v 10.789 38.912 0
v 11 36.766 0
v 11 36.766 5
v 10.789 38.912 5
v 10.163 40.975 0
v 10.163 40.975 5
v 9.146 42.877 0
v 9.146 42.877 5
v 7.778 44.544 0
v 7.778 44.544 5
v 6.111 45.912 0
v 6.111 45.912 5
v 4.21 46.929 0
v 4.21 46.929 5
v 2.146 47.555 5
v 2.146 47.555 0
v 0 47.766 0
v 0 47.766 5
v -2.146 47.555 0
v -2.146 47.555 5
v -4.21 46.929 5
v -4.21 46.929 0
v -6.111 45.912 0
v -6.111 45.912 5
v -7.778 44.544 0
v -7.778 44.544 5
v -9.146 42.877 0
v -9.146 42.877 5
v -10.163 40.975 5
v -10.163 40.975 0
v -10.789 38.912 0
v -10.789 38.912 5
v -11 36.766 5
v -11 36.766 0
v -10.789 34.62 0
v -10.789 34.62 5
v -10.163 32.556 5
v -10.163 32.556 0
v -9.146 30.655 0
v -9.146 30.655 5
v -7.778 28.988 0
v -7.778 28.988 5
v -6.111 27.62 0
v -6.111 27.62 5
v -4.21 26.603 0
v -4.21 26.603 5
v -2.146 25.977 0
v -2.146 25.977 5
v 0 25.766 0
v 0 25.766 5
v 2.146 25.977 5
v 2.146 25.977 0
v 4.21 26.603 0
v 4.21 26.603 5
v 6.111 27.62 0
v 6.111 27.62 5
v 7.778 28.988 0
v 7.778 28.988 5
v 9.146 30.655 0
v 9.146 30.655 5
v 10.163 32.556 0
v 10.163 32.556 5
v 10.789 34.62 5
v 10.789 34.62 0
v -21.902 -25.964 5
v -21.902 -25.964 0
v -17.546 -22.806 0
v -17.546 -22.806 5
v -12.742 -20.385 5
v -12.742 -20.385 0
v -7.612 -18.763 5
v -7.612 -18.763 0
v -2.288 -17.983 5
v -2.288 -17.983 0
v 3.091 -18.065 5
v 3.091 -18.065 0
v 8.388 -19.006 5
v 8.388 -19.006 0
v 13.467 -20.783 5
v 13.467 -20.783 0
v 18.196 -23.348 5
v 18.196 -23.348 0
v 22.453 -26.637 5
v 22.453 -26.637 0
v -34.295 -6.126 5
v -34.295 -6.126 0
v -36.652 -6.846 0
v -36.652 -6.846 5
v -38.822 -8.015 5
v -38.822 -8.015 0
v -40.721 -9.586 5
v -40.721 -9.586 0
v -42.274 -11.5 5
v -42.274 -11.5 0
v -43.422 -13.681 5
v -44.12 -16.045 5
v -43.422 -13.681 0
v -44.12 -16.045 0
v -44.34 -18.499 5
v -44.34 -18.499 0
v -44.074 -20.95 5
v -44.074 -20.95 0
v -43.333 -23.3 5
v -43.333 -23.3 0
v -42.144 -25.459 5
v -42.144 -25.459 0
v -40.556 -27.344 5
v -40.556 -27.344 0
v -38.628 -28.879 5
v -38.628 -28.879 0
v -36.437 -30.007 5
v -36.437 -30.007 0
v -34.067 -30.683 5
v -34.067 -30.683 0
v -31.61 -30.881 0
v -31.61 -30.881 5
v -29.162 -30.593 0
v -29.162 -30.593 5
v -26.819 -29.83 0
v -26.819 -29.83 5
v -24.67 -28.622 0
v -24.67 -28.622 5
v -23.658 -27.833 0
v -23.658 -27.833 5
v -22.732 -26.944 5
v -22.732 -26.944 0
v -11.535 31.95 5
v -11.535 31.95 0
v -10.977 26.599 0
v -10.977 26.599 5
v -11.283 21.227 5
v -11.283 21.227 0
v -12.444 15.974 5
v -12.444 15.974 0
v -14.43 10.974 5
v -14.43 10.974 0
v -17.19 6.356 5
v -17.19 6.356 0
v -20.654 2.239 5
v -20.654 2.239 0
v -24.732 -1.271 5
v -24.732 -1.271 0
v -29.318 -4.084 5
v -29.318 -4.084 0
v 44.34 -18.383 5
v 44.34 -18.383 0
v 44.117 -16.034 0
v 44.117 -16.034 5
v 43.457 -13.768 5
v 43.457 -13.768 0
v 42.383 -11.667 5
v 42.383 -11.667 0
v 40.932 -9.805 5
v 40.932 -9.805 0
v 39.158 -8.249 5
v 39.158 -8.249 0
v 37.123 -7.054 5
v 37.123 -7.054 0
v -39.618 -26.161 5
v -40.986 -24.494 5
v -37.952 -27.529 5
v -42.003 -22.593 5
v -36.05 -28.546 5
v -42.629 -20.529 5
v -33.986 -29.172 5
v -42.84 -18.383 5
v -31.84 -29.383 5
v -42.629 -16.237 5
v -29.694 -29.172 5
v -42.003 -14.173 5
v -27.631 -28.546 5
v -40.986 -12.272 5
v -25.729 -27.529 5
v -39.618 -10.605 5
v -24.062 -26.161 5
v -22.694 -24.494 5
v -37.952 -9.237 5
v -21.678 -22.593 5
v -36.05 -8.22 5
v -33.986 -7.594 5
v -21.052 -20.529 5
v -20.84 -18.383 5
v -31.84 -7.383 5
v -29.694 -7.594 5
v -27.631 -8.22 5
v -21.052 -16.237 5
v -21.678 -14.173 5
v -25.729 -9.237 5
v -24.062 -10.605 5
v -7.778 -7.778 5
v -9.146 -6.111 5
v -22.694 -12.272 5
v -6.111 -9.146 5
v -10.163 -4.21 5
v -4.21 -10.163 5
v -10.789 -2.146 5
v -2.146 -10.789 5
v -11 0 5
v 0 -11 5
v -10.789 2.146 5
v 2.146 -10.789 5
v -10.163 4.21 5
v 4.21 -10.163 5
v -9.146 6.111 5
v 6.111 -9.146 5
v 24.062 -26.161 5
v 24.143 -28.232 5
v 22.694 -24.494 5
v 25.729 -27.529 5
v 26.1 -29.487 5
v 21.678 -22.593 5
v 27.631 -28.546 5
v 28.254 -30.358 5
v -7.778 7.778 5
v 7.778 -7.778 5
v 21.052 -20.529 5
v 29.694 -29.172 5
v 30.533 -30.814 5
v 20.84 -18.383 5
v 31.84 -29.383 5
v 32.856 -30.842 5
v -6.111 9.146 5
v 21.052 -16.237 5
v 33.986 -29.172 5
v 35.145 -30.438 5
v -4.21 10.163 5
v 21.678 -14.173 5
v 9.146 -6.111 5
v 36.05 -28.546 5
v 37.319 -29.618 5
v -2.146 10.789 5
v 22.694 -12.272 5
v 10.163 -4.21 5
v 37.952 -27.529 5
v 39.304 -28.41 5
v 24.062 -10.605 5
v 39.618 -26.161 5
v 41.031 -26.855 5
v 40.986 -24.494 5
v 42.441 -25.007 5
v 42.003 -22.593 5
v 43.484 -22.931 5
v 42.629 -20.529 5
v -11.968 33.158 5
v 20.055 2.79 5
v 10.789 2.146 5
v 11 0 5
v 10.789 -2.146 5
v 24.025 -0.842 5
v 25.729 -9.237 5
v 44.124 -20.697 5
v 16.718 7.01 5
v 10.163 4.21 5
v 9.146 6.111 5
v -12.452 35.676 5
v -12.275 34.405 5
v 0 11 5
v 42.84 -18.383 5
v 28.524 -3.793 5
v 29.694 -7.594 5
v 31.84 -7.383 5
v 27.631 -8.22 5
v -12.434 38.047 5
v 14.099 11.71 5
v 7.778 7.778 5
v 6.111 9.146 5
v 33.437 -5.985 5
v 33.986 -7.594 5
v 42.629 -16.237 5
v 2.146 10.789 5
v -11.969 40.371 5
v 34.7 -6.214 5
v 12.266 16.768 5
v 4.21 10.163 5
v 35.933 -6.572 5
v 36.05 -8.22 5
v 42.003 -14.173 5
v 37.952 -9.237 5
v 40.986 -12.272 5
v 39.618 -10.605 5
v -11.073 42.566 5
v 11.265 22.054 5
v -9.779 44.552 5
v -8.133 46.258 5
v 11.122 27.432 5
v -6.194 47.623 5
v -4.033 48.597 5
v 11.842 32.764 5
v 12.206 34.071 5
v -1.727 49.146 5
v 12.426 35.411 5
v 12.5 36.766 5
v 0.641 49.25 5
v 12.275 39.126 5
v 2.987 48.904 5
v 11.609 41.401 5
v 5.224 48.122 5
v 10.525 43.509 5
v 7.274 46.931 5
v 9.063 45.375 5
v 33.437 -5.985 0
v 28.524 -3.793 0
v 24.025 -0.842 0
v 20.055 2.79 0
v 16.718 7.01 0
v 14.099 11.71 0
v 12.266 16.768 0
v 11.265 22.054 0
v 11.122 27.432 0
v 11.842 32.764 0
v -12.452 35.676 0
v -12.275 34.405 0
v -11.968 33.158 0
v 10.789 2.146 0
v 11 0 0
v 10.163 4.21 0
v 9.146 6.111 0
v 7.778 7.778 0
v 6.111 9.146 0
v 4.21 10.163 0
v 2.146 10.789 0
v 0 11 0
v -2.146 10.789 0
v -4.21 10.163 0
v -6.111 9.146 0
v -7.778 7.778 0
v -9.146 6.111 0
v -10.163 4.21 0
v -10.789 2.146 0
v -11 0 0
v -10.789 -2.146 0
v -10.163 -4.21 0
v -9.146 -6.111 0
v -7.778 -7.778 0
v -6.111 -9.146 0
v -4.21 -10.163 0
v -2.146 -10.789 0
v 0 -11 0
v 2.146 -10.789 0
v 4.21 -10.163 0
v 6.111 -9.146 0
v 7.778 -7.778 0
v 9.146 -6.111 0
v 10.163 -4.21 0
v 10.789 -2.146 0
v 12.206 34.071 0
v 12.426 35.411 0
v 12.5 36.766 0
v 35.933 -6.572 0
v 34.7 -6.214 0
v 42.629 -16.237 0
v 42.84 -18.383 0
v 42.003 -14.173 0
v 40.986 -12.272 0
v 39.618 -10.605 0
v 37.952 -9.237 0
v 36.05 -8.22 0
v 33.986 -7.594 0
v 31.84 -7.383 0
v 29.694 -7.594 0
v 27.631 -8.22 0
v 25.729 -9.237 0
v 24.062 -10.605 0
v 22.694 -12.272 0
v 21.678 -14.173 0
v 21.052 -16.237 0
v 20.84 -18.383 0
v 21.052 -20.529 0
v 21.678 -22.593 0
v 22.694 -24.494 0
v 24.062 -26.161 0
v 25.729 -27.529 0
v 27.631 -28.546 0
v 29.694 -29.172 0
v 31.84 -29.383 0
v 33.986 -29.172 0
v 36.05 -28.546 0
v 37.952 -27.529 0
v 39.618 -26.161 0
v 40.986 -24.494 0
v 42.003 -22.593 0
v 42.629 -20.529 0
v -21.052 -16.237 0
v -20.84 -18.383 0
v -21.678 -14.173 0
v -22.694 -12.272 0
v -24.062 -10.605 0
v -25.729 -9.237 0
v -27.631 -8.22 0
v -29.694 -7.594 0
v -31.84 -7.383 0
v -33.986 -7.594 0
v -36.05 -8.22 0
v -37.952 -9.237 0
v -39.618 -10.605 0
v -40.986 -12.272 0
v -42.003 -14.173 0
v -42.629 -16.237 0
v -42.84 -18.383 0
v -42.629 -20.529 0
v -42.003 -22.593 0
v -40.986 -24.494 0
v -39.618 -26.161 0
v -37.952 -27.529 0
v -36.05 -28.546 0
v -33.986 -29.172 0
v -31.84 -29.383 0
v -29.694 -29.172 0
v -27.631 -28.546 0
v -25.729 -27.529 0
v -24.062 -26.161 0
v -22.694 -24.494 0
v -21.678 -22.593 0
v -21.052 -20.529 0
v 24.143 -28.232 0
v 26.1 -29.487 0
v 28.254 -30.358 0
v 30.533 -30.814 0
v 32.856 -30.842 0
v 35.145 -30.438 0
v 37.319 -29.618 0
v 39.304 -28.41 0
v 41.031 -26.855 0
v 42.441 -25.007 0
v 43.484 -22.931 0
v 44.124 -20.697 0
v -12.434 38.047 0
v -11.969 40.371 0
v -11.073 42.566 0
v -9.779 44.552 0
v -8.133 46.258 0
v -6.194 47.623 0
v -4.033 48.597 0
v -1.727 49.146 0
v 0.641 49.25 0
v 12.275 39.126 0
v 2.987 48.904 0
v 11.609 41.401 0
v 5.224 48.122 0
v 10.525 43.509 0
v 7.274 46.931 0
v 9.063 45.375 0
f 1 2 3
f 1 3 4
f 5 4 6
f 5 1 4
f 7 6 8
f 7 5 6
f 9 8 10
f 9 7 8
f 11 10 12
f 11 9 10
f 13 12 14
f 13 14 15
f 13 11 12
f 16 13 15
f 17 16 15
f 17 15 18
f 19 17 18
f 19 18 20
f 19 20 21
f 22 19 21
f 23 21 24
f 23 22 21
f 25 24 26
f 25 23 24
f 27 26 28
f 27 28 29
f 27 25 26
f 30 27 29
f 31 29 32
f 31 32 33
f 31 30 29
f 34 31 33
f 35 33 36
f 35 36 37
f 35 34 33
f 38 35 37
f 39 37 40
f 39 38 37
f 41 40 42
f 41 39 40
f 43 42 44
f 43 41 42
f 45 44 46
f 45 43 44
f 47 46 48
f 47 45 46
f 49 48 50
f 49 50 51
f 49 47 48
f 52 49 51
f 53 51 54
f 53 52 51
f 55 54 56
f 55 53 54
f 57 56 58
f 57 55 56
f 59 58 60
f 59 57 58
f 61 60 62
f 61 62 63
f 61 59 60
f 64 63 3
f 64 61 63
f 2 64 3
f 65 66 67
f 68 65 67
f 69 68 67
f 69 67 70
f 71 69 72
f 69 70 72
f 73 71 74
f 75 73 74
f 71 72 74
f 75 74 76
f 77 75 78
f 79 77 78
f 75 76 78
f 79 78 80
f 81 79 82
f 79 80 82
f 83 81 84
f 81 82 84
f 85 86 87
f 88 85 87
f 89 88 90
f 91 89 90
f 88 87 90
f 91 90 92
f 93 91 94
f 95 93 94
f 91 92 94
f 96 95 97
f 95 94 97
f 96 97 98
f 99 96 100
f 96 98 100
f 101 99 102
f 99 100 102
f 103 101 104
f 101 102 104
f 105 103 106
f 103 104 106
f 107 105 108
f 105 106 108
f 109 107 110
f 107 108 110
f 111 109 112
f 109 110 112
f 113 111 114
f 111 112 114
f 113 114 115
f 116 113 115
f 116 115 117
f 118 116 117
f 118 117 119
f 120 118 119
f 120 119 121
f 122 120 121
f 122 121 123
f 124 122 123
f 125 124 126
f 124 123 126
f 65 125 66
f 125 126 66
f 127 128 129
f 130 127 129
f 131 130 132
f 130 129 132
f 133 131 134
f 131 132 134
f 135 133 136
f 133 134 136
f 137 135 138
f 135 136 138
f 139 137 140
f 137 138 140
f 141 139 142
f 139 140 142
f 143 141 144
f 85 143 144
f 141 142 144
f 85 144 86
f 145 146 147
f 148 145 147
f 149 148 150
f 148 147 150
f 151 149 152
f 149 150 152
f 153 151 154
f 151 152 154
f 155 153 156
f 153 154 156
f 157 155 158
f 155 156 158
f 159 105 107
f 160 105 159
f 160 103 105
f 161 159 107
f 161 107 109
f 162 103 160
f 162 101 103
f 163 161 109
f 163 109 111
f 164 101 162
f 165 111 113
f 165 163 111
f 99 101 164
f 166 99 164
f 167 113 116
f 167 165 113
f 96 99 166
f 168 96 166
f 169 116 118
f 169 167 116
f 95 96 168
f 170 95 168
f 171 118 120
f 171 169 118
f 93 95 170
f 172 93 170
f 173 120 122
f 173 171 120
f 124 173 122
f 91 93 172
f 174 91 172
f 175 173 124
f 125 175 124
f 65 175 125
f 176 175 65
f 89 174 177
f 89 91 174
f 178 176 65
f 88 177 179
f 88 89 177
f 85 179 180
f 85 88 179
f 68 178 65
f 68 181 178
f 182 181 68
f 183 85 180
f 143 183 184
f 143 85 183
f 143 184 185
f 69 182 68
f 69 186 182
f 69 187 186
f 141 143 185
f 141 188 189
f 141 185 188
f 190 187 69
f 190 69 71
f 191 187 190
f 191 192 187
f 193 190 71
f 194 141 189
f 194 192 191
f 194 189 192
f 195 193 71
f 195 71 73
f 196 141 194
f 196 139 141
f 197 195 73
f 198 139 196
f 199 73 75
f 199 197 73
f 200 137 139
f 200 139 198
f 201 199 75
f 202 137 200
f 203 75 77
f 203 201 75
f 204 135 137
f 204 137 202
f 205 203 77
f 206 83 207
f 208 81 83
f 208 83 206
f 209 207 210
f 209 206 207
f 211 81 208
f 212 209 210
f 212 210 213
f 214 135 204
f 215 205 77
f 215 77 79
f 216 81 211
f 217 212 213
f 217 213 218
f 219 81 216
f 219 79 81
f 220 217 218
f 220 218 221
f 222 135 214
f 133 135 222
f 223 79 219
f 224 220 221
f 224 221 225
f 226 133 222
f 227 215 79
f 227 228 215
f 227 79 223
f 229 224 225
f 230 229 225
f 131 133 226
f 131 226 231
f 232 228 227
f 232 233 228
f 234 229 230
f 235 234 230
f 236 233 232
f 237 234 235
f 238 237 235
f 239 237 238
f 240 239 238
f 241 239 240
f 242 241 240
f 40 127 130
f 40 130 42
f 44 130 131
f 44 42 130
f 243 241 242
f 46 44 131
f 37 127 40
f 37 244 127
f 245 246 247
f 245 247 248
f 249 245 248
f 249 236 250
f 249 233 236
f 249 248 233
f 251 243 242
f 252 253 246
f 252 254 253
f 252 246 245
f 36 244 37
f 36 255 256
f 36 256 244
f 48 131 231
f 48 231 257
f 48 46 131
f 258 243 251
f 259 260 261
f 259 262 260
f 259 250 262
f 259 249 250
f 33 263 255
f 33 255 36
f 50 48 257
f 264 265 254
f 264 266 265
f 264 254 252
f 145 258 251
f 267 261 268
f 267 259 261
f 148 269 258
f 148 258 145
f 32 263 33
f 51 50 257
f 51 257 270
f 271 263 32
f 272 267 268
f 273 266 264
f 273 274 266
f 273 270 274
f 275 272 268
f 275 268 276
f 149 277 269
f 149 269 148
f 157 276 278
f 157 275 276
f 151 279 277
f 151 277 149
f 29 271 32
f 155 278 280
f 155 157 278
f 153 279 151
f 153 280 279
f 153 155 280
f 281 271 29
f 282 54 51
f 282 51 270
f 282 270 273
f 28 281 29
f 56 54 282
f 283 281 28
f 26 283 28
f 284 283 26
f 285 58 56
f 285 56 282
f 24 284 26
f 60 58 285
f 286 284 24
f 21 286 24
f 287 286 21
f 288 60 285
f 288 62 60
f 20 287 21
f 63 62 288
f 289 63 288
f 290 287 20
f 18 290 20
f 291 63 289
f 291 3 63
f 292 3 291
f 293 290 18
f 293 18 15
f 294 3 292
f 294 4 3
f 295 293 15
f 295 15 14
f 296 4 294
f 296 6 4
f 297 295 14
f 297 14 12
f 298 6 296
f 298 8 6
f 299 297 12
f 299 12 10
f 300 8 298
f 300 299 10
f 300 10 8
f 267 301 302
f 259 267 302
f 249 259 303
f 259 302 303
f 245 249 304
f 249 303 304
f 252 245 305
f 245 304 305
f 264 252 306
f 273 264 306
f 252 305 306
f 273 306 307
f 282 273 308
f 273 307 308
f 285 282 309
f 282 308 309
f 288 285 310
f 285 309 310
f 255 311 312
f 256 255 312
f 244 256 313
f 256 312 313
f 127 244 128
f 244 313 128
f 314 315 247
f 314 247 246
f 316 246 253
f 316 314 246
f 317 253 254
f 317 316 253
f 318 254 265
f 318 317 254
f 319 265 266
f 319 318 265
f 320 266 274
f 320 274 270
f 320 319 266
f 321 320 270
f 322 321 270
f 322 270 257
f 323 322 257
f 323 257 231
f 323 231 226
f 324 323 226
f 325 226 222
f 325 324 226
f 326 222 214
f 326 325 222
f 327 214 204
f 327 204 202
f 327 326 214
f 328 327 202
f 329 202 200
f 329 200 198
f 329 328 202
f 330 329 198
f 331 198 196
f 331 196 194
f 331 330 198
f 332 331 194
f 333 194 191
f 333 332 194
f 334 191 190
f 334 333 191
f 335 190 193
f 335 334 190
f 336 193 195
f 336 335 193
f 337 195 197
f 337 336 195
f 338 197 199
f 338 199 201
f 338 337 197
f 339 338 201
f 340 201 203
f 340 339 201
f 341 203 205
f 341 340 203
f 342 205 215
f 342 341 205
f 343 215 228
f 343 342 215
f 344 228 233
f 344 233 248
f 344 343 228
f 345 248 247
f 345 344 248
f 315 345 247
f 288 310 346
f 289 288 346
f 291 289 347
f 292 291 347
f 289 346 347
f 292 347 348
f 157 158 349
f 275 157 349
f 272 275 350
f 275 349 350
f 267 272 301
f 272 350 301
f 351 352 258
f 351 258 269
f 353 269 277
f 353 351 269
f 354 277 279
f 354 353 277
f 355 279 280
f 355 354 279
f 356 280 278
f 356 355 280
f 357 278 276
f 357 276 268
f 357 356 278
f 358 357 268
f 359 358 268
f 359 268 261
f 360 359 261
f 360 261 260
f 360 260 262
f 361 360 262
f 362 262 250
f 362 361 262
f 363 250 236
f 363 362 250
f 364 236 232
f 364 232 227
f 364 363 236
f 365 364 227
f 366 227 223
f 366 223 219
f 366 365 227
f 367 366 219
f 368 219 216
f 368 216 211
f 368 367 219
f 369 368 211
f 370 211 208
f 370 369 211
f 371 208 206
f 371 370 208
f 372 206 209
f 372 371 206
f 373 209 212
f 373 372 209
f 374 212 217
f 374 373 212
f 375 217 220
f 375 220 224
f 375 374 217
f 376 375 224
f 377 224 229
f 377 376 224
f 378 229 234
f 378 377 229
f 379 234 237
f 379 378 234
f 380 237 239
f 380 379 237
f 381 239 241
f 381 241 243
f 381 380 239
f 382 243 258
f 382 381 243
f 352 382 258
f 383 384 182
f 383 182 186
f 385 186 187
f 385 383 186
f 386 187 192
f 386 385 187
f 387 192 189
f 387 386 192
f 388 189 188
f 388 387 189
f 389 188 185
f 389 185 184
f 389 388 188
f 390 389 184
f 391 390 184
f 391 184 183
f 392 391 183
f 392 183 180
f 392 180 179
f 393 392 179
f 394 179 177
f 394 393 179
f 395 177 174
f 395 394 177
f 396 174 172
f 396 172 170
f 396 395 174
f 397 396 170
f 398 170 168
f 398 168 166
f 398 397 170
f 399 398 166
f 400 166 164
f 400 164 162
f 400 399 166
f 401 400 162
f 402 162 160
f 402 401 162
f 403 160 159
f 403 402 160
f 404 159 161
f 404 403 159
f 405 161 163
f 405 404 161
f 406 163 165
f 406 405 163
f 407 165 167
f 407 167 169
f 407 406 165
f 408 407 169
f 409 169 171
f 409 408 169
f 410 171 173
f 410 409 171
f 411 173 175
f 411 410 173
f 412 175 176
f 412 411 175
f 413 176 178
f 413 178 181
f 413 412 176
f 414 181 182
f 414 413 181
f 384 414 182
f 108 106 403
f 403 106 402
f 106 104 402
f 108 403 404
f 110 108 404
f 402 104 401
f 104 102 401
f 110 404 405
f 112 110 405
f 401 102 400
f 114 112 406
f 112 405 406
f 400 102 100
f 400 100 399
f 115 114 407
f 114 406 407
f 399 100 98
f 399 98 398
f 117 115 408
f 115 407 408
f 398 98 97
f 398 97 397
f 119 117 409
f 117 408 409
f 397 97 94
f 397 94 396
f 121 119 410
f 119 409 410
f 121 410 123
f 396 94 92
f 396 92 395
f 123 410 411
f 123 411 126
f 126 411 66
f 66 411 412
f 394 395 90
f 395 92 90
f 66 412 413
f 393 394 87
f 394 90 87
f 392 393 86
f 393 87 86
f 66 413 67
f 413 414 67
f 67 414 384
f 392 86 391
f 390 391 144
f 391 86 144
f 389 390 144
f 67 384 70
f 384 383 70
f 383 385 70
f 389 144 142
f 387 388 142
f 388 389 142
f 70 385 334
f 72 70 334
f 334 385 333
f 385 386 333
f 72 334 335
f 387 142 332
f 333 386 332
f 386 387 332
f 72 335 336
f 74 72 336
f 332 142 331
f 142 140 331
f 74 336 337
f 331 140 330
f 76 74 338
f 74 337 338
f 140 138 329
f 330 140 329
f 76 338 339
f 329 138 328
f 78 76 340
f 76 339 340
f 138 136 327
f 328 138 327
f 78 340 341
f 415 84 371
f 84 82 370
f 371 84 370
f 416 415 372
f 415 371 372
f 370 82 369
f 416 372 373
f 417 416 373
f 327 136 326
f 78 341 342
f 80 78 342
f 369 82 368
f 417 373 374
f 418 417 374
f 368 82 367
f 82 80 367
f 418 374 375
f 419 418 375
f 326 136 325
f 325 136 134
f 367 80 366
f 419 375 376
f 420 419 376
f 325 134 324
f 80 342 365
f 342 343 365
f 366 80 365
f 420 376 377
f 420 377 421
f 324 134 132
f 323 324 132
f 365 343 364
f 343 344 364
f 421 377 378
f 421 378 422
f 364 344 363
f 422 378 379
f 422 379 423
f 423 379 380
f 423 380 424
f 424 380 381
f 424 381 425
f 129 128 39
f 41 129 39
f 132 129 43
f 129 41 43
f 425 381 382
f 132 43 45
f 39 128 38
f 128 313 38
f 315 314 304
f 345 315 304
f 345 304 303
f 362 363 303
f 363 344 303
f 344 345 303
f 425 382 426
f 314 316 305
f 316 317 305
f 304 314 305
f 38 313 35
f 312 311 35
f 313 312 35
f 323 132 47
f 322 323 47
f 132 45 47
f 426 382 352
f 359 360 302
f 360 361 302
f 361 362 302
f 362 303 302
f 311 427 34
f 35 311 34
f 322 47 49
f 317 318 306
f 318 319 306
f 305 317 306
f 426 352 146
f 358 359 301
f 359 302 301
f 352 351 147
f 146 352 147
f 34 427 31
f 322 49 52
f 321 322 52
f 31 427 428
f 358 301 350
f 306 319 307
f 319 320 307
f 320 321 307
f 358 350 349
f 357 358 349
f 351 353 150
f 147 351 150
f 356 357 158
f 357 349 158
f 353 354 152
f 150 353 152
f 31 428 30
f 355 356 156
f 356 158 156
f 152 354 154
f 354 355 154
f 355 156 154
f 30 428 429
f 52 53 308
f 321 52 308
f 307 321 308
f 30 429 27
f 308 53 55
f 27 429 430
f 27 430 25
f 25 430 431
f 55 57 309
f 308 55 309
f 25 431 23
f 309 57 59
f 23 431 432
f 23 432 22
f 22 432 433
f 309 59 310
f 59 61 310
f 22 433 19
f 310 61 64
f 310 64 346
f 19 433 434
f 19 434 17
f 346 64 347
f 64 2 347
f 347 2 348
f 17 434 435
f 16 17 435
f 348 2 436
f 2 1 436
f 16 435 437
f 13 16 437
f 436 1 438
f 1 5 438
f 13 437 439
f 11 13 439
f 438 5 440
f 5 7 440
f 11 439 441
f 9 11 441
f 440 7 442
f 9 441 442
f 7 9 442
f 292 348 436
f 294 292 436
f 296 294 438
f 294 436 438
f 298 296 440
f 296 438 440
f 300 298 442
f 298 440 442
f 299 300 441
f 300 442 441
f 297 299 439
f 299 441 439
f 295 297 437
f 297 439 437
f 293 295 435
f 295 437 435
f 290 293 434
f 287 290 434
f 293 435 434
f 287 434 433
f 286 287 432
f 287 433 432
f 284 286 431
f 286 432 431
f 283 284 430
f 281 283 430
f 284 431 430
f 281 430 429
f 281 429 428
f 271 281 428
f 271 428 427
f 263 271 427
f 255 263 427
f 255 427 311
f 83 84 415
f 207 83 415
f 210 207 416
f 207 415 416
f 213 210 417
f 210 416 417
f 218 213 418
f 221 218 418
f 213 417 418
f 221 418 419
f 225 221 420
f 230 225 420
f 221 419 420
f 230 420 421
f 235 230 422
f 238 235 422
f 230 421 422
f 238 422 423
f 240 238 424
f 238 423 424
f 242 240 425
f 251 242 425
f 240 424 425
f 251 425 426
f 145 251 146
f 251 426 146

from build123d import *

# Parameters (mm, degrees)
F0_R     = 11
F1_DEPTH = 5


with BuildPart() as f1:
    # F0 (on Top) → F1 (new body)
    with BuildSketch(Plane.XY):
        with BuildLine():
            ThreePointArc((11.8420038681, 32.7638646996), (12.3344040868, 34.7380581693), (12.5, 36.7659821877))
            ThreePointArc((12.5, 36.7659821877), (-0.5453664976, 49.2540795361), (-12.4524120613, 35.6762878018))
            ThreePointArc((-12.4524120613, 35.6762878018), (-11.9402706418, 33.8261206815), (-11.5348674443, 31.9496731192))
            ThreePointArc((-11.5348674443, 31.9496731192), (0.4350978948, 24.2735568899), (11.8420038681, 32.7638646996))
        make_face()
        with Locations((0, 36.7659821877)):
            Circle(F0_R, mode=Mode.SUBTRACT)
        with BuildLine():
            ThreePointArc((-11.5348674443, 31.9496731192), (-11.9402706418, 33.8261206815), (-12.4524120613, 35.6762878018))
            ThreePointArc((-12.4524120613, 35.6762878018), (-12.1375165816, 33.7775559745), (-11.5348674443, 31.9496731192))
        make_face()
        with BuildLine():
            ThreePointArc((33.436662286, -5.9853483236), (15.3144073066, 9.3071296076), (11.8420038681, 32.7638646996))
            ThreePointArc((11.8420038681, 32.7638646996), (0.4350978948, 24.2735568899), (-11.5348674443, 31.9496731192))
            ThreePointArc((-11.5348674443, 31.9496731192), (-15.7174143299, 8.6091009676), (-34.29534109, -6.1264561683))
            ThreePointArc((-34.29534109, -6.1264561683), (-23.9168388094, -8.7150458234), (-19.3402745697, -18.3829910939))
            ThreePointArc((-19.3402745697, -18.3829910939), (-19.9979564562, -22.3841786301), (-21.9017948417, -25.9643247956))
            ThreePointArc((-21.9017948417, -25.9643247956), (0.4030070232, -17.9162305753), (22.453337222, -26.6374085313))
            ThreePointArc((22.453337222, -26.6374085313), (20.8039679594, -12.513584275), (33.436662286, -5.9853483236))
        make_face()
        Circle(F0_R, mode=Mode.SUBTRACT)
        with BuildLine():
            ThreePointArc((37.1227775797, -7.0540387174), (35.2644151426, -6.5724826369), (33.436662286, -5.9853483236))
            ThreePointArc((33.436662286, -5.9853483236), (20.8039679594, -12.513584275), (22.453337222, -26.6374085313))
            ThreePointArc((22.453337222, -26.6374085313), (36.2512428961, -30.0788603828), (44.3402745697, -18.3829910939))
            ThreePointArc((44.3402745697, -18.3829910939), (42.3826008695, -11.6666411784), (37.1227775797, -7.0540387174))
        make_face()
        with Locations((31.8402745697, -18.3829910939)):
            Circle(F0_R, mode=Mode.SUBTRACT)
        with BuildLine():
            ThreePointArc((37.1227775797, -7.0540387174), (35.3209798424, -6.3773802887), (33.436662286, -5.9853483236))
            ThreePointArc((33.436662286, -5.9853483236), (35.2644151426, -6.5724826369), (37.1227775797, -7.0540387174))
        make_face()
        with BuildLine():
            ThreePointArc((-19.3402745697, -18.3829910939), (-23.9168388094, -8.7150458234), (-34.29534109, -6.1264561683))
            ThreePointArc((-34.29534109, -6.1264561683), (-43.3325593622, -23.3000420644), (-24.6703655184, -28.6222490844))
            ThreePointArc((-24.6703655184, -28.6222490844), (-23.3241445007, -27.2536380446), (-21.9017948417, -25.9643247956))
            ThreePointArc((-21.9017948417, -25.9643247956), (-19.9979564562, -22.3841786301), (-19.3402745697, -18.3829910939))
        make_face()
        with Locations((-31.8402745697, -18.3829910939)):
            Circle(F0_R, mode=Mode.SUBTRACT)
        with BuildLine():
            ThreePointArc((-21.9017948417, -25.9643247956), (-23.3241445007, -27.2536380446), (-24.6703655184, -28.6222490844))
            ThreePointArc((-24.6703655184, -28.6222490844), (-23.1834632609, -27.4001756857), (-21.9017948417, -25.9643247956))
        make_face()
    extrude(amount=F1_DEPTH)


solid = f1.part
